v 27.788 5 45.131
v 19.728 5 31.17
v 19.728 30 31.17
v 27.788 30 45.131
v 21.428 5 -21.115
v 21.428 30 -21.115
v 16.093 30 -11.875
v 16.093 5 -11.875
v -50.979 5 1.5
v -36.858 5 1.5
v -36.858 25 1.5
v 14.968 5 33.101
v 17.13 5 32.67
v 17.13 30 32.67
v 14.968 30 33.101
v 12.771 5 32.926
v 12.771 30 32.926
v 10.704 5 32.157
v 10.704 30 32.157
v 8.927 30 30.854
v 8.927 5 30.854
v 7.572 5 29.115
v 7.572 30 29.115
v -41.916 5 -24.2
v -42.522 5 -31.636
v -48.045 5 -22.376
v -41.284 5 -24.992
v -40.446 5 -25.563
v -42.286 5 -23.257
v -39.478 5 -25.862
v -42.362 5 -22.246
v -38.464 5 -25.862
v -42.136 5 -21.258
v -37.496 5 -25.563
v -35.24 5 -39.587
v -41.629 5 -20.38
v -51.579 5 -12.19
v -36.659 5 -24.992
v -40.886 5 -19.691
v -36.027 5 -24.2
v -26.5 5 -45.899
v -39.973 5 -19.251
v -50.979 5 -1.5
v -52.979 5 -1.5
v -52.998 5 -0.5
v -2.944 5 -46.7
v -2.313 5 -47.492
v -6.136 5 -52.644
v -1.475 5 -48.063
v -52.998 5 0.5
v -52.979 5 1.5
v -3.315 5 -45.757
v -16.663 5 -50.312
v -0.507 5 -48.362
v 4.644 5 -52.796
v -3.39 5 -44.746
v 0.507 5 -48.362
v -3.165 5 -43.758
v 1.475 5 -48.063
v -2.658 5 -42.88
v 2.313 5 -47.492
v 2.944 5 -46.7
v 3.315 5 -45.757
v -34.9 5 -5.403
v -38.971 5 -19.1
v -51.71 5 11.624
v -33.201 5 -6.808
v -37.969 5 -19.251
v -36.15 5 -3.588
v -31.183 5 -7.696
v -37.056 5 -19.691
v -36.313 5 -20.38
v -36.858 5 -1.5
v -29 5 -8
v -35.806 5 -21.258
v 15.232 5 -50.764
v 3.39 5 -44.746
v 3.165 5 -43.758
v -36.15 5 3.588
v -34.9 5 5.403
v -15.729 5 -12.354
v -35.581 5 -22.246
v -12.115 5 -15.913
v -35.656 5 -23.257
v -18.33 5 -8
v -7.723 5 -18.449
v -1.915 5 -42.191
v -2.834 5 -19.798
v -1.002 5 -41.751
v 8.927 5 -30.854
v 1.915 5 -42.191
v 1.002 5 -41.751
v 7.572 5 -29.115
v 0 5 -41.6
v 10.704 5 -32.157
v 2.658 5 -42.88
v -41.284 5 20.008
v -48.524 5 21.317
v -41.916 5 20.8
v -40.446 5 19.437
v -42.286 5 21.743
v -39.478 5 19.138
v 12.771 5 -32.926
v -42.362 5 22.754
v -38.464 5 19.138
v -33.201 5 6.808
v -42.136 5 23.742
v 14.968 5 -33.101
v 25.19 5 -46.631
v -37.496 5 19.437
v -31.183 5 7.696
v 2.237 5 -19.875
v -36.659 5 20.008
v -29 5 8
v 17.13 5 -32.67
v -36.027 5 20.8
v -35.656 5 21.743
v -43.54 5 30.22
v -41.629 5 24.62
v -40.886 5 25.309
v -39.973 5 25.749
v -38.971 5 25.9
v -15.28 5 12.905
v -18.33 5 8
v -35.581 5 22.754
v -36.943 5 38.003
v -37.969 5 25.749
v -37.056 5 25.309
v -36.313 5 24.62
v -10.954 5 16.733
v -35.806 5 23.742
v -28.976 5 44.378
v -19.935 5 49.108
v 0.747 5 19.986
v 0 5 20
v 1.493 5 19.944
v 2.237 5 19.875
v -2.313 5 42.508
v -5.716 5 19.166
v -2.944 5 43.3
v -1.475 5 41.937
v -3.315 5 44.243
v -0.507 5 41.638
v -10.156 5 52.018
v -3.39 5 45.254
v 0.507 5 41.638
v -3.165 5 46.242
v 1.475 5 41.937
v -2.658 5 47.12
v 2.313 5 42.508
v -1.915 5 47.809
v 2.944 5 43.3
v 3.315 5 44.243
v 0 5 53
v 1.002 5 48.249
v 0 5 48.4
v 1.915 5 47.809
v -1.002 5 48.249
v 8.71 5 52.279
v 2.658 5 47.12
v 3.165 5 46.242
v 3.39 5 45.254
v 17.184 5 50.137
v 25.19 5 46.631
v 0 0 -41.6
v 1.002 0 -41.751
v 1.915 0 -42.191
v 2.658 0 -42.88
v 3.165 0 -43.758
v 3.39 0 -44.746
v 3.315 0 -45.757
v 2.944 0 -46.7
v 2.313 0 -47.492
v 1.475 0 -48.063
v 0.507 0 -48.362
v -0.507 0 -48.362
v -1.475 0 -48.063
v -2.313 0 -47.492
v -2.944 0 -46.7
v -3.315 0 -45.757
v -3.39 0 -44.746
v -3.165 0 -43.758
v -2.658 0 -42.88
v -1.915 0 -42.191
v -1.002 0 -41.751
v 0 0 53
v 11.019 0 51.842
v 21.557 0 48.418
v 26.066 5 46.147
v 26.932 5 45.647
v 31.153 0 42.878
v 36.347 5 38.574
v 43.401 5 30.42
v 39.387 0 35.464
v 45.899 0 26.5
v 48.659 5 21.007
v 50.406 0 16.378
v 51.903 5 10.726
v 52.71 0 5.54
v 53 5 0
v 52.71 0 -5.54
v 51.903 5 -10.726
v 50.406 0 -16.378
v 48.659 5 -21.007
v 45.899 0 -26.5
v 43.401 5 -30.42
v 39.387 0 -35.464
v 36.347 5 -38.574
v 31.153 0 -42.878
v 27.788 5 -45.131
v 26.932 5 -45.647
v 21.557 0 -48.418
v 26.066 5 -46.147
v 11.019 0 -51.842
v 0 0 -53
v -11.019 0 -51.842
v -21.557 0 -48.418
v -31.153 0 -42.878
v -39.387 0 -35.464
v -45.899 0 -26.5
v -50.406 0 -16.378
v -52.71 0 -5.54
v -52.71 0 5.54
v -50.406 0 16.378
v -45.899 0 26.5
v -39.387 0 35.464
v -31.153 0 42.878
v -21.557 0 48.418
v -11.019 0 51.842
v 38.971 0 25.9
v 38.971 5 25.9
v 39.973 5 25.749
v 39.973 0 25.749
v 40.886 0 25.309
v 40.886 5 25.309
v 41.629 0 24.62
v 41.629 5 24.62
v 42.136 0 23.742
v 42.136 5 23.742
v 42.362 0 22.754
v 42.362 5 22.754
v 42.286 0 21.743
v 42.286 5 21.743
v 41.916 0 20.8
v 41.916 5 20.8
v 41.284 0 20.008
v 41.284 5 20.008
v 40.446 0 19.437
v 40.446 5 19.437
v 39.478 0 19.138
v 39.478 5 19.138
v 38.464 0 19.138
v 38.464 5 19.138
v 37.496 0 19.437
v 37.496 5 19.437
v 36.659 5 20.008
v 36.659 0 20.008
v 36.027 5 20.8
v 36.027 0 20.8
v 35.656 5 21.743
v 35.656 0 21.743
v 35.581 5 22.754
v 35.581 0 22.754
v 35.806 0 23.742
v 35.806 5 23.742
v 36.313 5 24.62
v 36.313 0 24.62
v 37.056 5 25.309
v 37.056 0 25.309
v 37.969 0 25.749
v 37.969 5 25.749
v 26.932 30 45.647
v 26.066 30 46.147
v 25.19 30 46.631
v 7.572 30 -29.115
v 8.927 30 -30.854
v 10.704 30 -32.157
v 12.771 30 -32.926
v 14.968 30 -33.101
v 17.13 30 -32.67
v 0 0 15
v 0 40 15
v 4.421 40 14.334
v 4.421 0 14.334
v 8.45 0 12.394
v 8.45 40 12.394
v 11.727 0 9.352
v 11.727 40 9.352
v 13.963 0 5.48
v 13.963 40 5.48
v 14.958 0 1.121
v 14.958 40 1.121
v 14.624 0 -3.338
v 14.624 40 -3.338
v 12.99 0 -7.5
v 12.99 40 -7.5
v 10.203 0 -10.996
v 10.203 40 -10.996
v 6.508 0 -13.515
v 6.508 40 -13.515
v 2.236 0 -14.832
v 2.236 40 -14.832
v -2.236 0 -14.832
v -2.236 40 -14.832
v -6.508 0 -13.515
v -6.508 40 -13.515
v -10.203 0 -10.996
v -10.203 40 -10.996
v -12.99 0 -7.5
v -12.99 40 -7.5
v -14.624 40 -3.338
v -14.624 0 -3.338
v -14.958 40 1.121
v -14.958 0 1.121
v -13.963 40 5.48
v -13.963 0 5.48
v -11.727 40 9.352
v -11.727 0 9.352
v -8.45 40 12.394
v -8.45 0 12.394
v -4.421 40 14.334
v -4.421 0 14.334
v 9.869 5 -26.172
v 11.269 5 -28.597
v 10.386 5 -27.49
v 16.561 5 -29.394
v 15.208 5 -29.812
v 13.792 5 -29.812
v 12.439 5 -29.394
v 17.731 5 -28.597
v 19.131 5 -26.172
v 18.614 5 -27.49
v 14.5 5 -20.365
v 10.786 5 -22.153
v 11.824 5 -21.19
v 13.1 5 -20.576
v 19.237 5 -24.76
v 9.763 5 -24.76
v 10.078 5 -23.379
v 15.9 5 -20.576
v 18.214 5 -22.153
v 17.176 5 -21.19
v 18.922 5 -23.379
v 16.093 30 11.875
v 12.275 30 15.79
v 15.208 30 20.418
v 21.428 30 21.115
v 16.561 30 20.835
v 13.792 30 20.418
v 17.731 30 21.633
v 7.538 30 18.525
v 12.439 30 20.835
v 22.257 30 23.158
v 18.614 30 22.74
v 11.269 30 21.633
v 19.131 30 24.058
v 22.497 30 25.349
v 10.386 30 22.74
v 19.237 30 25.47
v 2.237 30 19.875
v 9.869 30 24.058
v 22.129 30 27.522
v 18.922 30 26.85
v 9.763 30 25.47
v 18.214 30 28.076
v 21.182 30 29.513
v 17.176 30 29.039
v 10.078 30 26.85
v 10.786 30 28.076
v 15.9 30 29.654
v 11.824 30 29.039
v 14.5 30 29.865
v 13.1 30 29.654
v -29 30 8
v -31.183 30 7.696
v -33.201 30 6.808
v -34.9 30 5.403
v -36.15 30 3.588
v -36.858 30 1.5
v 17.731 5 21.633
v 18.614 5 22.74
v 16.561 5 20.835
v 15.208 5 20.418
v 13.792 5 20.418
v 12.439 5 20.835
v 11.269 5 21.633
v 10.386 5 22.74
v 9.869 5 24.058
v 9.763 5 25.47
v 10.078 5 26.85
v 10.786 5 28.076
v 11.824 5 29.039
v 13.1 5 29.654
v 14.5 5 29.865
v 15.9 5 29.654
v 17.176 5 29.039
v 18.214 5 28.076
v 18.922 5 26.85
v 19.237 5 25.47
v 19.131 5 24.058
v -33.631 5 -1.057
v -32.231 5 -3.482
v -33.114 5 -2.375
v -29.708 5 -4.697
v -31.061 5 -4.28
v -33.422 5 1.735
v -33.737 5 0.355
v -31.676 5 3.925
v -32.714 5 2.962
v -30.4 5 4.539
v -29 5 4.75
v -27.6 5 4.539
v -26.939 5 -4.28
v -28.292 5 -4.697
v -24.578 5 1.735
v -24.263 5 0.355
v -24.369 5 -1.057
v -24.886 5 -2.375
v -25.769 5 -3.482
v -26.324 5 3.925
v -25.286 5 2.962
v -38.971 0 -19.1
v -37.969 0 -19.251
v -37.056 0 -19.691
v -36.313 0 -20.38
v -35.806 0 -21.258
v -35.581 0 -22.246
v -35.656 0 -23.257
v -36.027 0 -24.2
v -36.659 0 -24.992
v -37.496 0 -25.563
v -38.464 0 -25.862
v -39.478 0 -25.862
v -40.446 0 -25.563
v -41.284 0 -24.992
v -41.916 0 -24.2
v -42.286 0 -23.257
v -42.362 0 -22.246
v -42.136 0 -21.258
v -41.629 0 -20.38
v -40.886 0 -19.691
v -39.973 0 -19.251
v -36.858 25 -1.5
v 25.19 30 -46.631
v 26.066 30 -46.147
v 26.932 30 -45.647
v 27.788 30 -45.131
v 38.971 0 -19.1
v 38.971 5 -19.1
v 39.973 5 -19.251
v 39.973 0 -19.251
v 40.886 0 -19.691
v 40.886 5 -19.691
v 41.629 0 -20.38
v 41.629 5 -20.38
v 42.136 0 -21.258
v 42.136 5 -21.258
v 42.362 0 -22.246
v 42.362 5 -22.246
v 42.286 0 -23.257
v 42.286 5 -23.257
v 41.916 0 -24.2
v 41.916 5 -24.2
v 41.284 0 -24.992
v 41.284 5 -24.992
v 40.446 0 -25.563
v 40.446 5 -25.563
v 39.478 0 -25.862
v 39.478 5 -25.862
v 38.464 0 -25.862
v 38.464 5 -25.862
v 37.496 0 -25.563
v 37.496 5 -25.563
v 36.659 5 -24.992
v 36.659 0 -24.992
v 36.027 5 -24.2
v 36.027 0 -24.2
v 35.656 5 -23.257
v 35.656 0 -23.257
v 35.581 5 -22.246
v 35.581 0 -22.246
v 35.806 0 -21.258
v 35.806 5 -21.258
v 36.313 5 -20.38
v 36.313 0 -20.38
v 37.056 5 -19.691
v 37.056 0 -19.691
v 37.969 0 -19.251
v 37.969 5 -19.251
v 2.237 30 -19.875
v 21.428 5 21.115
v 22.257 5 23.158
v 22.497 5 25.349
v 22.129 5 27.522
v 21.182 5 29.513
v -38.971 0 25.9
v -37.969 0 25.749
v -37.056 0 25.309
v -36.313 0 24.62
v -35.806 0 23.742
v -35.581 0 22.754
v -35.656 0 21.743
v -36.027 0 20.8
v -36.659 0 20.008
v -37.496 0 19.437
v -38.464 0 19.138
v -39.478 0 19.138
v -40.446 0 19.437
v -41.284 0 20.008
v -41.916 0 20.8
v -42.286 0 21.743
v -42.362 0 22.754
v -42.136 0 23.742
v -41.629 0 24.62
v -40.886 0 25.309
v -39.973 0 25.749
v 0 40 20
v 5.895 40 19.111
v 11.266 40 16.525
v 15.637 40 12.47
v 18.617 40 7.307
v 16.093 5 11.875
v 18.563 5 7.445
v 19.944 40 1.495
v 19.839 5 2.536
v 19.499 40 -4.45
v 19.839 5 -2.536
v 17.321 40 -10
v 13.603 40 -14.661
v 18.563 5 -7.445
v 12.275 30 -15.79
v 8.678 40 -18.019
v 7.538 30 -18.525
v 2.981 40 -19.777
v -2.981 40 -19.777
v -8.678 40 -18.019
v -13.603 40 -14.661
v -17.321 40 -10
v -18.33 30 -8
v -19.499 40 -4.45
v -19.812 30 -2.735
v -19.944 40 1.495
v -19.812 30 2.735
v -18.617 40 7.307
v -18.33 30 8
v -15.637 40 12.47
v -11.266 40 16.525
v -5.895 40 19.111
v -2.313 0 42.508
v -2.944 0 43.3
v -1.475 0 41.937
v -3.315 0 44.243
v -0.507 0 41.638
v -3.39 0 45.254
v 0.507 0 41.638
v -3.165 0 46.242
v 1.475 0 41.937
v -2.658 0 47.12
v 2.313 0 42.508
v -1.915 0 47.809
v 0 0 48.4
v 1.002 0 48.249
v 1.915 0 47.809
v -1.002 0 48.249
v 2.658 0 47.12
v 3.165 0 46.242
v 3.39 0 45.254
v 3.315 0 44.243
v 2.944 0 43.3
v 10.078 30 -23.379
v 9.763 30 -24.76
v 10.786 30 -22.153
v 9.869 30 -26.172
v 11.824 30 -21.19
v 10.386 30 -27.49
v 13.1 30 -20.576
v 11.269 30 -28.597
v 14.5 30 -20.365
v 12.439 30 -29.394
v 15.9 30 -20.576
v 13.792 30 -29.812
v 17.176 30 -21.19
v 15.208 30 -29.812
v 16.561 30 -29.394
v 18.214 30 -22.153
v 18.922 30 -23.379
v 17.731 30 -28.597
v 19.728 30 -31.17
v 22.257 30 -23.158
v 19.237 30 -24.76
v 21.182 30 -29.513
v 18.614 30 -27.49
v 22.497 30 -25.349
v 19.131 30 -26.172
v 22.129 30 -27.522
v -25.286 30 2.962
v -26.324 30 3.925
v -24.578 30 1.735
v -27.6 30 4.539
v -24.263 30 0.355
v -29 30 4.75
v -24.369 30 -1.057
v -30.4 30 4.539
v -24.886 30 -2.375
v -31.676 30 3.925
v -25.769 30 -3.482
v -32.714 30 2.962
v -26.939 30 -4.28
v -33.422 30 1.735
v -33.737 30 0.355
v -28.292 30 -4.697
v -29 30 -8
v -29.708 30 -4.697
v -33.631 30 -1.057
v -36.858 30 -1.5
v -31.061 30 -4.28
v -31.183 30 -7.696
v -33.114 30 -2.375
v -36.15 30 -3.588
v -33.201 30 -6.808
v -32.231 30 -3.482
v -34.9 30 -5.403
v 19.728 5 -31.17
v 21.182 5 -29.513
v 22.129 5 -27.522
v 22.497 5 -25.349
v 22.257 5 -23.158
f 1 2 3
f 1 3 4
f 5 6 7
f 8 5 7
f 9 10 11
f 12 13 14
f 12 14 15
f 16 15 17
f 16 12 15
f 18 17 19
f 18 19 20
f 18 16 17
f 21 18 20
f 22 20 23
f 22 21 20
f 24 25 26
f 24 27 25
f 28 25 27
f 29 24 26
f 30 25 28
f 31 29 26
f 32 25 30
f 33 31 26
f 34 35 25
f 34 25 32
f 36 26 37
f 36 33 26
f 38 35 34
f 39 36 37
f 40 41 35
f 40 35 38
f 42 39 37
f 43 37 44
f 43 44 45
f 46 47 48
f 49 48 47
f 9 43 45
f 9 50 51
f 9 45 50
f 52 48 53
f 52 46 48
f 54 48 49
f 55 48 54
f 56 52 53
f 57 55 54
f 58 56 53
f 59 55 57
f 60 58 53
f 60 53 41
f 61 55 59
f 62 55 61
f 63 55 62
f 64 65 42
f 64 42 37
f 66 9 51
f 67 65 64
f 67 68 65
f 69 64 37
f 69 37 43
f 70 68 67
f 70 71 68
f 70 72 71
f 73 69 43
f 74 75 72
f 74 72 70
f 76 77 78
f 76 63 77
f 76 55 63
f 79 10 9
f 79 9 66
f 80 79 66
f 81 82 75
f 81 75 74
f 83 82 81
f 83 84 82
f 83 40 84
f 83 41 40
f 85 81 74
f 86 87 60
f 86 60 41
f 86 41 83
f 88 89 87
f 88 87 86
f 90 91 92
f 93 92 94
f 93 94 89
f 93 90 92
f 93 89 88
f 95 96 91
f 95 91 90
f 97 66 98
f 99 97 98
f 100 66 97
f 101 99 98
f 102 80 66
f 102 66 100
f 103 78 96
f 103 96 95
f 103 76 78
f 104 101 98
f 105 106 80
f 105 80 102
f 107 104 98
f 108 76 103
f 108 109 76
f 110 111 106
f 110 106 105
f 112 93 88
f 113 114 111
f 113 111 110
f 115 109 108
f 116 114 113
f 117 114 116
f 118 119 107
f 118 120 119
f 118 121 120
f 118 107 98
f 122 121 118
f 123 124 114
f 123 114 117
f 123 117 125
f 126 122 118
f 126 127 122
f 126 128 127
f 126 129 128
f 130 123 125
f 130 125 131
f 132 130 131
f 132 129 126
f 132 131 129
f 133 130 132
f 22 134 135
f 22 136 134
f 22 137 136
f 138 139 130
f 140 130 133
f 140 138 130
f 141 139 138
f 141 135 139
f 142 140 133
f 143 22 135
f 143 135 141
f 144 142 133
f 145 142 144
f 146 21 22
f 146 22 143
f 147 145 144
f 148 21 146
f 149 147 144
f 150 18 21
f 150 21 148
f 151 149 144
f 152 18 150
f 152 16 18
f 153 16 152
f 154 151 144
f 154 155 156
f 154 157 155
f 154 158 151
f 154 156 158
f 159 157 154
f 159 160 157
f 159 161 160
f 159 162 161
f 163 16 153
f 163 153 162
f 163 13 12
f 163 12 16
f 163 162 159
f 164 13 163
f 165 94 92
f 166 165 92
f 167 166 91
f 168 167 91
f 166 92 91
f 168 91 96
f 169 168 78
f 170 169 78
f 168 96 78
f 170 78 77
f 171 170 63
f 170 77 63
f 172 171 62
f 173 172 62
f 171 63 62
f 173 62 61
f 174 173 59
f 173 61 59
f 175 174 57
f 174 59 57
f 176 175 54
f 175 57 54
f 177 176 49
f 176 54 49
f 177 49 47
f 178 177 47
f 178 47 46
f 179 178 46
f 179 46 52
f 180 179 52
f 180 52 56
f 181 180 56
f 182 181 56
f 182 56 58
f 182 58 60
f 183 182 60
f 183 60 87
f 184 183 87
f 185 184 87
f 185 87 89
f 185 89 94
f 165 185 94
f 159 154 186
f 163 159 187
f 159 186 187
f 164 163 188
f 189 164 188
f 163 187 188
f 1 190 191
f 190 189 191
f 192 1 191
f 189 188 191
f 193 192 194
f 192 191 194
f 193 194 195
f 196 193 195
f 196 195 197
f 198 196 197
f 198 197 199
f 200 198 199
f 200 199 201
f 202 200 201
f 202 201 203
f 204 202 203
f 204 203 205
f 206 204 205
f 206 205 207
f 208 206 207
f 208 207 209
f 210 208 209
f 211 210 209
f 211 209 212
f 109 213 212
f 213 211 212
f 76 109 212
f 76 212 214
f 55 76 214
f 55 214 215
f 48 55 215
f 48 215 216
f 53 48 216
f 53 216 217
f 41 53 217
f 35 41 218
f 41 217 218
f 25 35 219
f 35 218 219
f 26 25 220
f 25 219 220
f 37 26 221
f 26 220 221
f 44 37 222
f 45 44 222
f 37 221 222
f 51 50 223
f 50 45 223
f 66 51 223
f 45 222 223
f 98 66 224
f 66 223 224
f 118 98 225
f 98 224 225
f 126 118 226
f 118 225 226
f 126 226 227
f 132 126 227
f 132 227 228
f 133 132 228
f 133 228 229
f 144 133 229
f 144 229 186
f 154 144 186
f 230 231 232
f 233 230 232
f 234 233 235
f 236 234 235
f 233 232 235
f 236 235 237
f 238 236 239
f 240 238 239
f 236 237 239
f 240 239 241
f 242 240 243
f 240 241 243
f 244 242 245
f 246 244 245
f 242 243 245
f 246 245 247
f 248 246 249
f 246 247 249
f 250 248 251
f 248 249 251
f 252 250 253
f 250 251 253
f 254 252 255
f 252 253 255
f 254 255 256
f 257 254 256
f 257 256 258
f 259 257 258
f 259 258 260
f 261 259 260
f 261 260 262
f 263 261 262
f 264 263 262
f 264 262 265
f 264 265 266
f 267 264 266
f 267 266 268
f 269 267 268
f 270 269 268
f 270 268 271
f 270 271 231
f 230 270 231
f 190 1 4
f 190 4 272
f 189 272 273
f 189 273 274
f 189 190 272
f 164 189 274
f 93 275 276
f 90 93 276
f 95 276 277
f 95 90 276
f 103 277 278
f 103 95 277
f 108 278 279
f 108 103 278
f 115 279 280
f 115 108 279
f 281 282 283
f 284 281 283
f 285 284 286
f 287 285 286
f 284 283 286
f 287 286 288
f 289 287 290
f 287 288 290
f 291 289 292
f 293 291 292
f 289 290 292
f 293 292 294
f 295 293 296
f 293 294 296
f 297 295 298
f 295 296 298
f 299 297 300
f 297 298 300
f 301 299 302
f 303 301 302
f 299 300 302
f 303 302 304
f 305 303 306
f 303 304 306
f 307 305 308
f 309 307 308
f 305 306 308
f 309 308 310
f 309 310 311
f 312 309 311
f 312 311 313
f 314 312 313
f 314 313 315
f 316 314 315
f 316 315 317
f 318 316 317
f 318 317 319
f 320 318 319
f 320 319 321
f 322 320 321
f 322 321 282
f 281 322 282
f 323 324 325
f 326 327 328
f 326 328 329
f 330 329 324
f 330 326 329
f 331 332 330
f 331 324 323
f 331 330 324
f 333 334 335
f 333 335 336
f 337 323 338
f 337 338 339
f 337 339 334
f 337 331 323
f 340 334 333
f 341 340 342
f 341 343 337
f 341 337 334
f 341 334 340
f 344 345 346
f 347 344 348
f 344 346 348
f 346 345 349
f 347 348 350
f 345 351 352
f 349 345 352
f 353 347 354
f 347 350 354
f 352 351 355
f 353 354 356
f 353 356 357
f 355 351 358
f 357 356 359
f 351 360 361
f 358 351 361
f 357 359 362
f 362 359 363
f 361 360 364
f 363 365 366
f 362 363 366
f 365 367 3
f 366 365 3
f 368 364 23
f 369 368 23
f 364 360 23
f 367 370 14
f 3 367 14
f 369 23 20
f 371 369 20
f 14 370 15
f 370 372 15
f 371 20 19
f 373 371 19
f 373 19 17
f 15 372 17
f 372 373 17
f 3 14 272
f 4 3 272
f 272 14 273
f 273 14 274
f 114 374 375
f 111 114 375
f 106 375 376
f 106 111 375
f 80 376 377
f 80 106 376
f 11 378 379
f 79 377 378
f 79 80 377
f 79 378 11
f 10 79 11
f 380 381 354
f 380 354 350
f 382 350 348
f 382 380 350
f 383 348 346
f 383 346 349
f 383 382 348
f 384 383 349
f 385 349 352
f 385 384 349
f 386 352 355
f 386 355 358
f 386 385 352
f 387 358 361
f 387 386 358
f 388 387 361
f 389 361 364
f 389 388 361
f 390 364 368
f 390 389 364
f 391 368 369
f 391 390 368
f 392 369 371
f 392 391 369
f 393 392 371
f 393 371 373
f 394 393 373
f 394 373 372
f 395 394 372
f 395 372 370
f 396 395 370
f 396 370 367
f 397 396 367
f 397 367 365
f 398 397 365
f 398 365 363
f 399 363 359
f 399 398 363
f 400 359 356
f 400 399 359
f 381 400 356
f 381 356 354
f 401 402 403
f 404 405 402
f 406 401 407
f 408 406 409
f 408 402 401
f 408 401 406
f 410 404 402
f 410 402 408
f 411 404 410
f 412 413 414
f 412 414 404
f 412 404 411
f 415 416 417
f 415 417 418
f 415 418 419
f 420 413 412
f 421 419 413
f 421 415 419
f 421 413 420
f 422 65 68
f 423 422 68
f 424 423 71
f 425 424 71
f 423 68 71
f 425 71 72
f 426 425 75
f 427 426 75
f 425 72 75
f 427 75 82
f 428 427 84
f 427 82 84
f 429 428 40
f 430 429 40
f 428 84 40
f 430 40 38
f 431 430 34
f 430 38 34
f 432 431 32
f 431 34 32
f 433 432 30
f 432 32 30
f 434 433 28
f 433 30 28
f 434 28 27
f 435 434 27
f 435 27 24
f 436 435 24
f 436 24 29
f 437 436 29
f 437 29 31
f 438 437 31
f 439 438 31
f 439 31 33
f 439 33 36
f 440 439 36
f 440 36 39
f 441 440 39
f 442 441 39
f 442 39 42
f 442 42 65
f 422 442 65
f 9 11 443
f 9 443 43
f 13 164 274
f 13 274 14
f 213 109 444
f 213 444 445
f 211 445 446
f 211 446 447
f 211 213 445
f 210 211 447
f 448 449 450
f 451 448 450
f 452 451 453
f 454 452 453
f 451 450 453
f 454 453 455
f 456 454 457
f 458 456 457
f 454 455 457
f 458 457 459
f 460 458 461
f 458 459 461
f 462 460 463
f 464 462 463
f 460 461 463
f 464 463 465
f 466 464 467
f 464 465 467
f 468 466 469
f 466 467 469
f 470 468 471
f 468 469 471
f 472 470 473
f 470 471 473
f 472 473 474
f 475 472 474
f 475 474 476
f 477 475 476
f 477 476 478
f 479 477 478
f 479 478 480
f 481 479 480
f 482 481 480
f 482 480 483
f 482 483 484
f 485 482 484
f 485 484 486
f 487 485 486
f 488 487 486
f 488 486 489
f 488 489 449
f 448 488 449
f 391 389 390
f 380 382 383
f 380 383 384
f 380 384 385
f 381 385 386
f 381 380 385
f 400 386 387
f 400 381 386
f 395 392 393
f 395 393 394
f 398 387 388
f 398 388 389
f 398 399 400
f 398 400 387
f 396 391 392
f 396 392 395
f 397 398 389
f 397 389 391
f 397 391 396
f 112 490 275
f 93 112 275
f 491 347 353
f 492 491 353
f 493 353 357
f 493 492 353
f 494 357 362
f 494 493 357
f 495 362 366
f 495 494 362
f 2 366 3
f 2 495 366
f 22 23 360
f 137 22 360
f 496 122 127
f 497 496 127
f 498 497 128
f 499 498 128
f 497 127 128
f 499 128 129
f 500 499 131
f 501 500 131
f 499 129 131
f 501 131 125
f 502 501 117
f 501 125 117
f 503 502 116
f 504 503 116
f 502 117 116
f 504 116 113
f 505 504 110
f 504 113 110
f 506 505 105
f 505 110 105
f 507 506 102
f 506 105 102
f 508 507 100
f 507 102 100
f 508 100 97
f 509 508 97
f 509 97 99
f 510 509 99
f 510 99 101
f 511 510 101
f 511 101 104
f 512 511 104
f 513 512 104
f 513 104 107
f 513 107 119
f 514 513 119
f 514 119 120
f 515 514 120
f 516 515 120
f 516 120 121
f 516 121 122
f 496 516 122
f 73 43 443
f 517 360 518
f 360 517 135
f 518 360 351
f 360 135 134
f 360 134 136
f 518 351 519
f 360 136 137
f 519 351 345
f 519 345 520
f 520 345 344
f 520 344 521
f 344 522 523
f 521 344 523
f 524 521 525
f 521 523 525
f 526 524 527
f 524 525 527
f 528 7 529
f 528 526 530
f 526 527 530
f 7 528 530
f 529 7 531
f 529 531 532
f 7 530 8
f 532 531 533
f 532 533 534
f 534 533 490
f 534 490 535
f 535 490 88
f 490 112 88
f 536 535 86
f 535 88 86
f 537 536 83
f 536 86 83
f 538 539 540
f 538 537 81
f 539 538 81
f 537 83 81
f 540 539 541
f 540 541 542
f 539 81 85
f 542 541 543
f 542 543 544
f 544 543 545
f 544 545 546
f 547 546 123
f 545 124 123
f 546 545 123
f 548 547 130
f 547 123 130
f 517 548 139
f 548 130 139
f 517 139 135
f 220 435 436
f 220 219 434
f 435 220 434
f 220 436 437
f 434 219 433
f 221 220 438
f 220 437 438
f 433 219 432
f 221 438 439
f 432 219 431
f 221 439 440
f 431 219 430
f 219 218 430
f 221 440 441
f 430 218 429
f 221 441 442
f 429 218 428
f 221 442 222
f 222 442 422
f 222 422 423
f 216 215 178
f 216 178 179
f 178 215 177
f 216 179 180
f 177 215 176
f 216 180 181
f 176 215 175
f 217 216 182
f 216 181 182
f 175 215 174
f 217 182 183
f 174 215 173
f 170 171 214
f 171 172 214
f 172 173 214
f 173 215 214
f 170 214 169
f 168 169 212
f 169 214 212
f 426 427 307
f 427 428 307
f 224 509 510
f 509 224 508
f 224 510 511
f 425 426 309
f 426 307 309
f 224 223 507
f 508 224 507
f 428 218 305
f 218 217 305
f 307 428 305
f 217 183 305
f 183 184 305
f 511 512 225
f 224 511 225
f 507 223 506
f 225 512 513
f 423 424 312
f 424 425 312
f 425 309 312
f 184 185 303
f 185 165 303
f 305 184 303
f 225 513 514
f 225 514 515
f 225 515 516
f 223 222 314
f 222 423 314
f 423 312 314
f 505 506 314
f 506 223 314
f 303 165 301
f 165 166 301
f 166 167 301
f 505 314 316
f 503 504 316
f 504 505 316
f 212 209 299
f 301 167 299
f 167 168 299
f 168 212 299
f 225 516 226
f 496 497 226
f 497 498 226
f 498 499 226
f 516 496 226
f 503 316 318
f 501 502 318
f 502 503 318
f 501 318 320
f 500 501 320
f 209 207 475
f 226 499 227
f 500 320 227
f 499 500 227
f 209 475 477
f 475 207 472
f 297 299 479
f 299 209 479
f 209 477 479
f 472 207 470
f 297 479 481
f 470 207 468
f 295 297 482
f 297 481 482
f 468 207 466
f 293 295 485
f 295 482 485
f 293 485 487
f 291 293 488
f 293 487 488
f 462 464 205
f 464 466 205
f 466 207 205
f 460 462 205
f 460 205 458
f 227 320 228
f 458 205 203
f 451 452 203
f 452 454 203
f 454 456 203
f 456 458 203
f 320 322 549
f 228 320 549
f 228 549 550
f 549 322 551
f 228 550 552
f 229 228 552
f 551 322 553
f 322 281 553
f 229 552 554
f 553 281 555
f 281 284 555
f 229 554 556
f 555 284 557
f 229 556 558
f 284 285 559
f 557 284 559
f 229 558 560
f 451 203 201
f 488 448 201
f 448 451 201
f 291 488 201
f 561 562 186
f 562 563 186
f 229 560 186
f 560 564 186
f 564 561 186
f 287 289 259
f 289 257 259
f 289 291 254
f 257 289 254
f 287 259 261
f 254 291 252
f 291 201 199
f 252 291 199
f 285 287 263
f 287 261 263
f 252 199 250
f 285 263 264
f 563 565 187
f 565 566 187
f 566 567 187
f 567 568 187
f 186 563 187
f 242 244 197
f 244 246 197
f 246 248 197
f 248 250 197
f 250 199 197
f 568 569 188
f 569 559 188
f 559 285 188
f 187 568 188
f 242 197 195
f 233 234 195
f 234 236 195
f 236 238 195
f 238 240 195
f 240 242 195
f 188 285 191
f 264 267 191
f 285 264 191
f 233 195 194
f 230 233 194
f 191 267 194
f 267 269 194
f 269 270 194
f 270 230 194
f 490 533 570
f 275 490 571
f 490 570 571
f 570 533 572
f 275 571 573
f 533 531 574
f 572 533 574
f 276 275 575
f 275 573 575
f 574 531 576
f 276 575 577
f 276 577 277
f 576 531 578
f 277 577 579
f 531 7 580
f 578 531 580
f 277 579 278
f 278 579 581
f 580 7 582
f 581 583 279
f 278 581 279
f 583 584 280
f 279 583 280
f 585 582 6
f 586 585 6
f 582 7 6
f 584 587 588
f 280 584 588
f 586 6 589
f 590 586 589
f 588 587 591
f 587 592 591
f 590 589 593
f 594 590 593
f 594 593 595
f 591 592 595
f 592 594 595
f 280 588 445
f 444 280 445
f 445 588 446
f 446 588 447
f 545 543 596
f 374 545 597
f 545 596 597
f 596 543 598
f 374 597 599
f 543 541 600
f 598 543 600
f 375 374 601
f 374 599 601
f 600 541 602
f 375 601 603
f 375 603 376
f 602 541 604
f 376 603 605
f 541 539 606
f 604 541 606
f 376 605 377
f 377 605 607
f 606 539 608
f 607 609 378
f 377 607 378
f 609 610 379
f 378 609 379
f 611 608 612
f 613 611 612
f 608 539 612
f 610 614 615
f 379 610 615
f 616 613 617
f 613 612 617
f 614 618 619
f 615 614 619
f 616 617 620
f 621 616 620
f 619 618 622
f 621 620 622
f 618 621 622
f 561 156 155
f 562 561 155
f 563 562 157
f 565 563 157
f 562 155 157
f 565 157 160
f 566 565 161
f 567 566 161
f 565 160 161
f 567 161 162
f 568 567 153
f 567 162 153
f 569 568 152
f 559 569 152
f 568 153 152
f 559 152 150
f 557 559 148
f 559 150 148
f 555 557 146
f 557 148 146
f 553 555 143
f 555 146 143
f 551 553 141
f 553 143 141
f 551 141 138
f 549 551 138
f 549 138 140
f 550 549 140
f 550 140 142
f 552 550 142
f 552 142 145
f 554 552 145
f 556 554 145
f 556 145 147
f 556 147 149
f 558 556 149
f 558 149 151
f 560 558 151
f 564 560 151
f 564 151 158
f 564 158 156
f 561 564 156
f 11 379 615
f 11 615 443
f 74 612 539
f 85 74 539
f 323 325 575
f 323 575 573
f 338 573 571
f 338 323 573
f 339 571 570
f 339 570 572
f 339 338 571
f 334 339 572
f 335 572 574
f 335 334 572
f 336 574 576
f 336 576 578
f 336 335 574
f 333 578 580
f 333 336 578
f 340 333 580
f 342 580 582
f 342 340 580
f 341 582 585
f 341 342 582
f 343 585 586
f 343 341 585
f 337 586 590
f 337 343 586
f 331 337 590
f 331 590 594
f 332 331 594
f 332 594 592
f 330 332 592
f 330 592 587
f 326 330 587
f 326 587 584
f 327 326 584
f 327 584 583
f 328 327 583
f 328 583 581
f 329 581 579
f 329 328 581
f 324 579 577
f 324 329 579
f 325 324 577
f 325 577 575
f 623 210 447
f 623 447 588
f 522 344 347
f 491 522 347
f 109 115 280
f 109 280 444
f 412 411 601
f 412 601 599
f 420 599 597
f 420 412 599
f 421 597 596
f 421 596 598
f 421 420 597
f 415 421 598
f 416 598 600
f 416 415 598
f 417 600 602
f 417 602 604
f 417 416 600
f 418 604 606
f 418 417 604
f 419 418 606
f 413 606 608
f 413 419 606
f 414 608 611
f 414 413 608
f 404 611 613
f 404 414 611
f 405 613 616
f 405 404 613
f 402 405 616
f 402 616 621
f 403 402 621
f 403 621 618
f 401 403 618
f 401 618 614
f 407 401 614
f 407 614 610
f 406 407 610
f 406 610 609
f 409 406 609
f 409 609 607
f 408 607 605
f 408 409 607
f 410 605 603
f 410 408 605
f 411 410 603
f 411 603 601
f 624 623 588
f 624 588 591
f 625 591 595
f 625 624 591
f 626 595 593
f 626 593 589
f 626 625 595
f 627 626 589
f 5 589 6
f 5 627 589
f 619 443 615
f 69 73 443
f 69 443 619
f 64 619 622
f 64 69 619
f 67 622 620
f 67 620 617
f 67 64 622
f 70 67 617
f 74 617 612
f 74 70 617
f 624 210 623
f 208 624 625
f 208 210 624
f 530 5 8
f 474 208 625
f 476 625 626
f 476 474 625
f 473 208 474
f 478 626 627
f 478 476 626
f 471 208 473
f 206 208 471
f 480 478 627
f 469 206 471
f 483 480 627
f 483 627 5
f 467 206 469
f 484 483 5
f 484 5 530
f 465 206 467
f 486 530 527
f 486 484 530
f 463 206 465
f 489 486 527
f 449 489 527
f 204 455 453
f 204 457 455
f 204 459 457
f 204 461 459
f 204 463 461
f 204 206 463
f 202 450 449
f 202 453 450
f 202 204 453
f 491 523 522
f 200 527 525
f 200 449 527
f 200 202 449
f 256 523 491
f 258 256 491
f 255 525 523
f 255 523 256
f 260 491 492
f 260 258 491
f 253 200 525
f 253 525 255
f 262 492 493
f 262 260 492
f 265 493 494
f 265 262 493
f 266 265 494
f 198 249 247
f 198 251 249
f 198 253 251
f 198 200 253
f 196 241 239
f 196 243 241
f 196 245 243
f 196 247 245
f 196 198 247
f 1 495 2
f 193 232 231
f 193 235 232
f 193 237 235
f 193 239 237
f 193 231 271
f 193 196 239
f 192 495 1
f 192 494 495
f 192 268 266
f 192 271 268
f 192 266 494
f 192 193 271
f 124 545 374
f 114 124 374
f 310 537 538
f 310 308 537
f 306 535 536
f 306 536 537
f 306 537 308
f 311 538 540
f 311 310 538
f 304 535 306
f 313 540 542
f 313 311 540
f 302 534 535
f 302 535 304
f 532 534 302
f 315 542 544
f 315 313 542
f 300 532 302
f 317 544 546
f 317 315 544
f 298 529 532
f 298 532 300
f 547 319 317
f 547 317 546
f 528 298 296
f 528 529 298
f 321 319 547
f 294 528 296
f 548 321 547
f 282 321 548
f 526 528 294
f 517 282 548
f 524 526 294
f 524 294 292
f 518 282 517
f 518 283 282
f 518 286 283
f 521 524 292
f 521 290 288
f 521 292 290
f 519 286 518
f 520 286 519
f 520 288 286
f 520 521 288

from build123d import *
from build123d.topology import SkipClean

# Parameters (mm, degrees)
SKETCH1_R           = 53
BOSS_EXTRUDE1_DEPTH = 5
SKETCH2_R           = 20
BOSS_EXTRUDE2_DEPTH = 35
SKETCH3_R           = 15
CUT_EXTRUDE1_DEPTH  = 85.958813551
BOSS_EXTRUDE3_START = -25
SKETCH4_R           = 4.75
BOSS_EXTRUDE3_DEPTH = 25
CUT_EXTRUDE2_DEPTH  = 86.902561079
CIRPATTERN1_COUNT   = 3
SKETCH6_R           = 3.4
CUT_EXTRUDE3_DEPTH  = 83.722427431


with BuildPart() as part:
    # Sketch1 → Boss-Extrude1 (new body)
    with BuildSketch(Plane(origin=(0, 0, 0), x_dir=(1, 0, 0), z_dir=(0, 1, 0))):
        with Locations(Location((0, 0, 0), (0, 0, 270))):
            Circle(SKETCH1_R)
    extrude(amount=BOSS_EXTRUDE1_DEPTH)

    # Sketch2 → Boss-Extrude2 (add)
    with BuildSketch(Plane(origin=(0, 5, 0), x_dir=(1, 0, 0), z_dir=(0, 1, 0))):
        with Locations(Location((0, 0, 0), (0, 0, 270))):
            Circle(SKETCH2_R)
    extrude(amount=BOSS_EXTRUDE2_DEPTH)

    # Sketch3 → Cut-Extrude1 (cut, through all)
    with BuildSketch(Plane(origin=(0, 40, 0), x_dir=(1, 0, 0), z_dir=(0, 1, 0))):
        with Locations(Location((0, 0, 0), (0, 0, 270))):
            Circle(SKETCH3_R)
    extrude(amount=-CUT_EXTRUDE1_DEPTH, mode=Mode.SUBTRACT)

    # Sketch4 → Boss-Extrude3 (add)
    with BuildSketch(Plane(origin=(0, 30, 0), x_dir=(1, 0, 0), z_dir=(0, 1, 0)).offset(BOSS_EXTRUDE3_START)):
        with BuildLine():
            Line((-29, 8), (-18.33030278, 8))
            ThreePointArc((-18.33030278, 8), (-20, 0), (-18.33030278, -8))
            Line((-18.33030278, -8), (-29, -8))
            ThreePointArc((-29, -8), (-34.099019514, -6.164414003), (-36.858116823, -1.5))
            Line((-36.858116823, -1.5), (-52.978769333, -1.5))
            ThreePointArc((-52.978769333, -1.5), (-53, 0), (-52.978769333, 1.5))
            Line((-52.978769333, 1.5), (-36.858116823, 1.5))
            ThreePointArc((-36.858116823, 1.5), (-34.099019514, 6.164414003), (-29, 8))
        make_face()
        with Locations(Location((-29, 0, 0), (0, 0, 270))):
            Circle(SKETCH4_R, mode=Mode.SUBTRACT)
    boss_extrude3 = extrude(amount=BOSS_EXTRUDE3_DEPTH)

    # Sketch5 → Cut-Extrude2 (cut, through all)
    with BuildSketch(Plane.XY.offset(1.5)):
        Polygon((-36.858116823, 25), (-50.978769333, 5), (-53.978769333, 5), (-53.978769333, 30), (-36.858116823, 30), align=None)
    extrude(amount=-CUT_EXTRUDE2_DEPTH, mode=Mode.SUBTRACT)

    # CirPattern1: Boss-Extrude3 ×3 about axis
    with SkipClean():  # the faces are left unmerged after this step: merging them gives an invalid solid
        cirpattern1_axis = Axis((0, 0, 0), (0, 1, 0))
        for i in range(1, CIRPATTERN1_COUNT):
            add(boss_extrude3.rotate(cirpattern1_axis, i * 360 / CIRPATTERN1_COUNT))

    # Sketch6 → Cut-Extrude3 (cut, through all)
    with SkipClean():  # the faces are left unmerged after this step: merging them gives an invalid solid
        with BuildSketch(Plane(origin=(0, 5, 0), x_dir=(1, 0, 0), z_dir=(0, 1, 0))):
            with Locations(Location((0, 45, 0), (0, 0, 270))):
                Circle(SKETCH6_R)
            with Locations(Location((38.97114317, 22.5, 0), (0, 0, 270))):
                Circle(SKETCH6_R)
            with Locations(Location((38.97114317, -22.5, 0), (0, 0, 270))):
                Circle(SKETCH6_R)
            with Locations(Location((0, -45, 0), (0, 0, 270))):
                Circle(SKETCH6_R)
            with Locations(Location((-38.97114317, -22.5, 0), (0, 0, 270))):
                Circle(SKETCH6_R)
            with Locations(Location((-38.97114317, 22.5, 0), (0, 0, 270))):
                Circle(SKETCH6_R)
        extrude(amount=-CUT_EXTRUDE3_DEPTH, mode=Mode.SUBTRACT)


solid = part.part
